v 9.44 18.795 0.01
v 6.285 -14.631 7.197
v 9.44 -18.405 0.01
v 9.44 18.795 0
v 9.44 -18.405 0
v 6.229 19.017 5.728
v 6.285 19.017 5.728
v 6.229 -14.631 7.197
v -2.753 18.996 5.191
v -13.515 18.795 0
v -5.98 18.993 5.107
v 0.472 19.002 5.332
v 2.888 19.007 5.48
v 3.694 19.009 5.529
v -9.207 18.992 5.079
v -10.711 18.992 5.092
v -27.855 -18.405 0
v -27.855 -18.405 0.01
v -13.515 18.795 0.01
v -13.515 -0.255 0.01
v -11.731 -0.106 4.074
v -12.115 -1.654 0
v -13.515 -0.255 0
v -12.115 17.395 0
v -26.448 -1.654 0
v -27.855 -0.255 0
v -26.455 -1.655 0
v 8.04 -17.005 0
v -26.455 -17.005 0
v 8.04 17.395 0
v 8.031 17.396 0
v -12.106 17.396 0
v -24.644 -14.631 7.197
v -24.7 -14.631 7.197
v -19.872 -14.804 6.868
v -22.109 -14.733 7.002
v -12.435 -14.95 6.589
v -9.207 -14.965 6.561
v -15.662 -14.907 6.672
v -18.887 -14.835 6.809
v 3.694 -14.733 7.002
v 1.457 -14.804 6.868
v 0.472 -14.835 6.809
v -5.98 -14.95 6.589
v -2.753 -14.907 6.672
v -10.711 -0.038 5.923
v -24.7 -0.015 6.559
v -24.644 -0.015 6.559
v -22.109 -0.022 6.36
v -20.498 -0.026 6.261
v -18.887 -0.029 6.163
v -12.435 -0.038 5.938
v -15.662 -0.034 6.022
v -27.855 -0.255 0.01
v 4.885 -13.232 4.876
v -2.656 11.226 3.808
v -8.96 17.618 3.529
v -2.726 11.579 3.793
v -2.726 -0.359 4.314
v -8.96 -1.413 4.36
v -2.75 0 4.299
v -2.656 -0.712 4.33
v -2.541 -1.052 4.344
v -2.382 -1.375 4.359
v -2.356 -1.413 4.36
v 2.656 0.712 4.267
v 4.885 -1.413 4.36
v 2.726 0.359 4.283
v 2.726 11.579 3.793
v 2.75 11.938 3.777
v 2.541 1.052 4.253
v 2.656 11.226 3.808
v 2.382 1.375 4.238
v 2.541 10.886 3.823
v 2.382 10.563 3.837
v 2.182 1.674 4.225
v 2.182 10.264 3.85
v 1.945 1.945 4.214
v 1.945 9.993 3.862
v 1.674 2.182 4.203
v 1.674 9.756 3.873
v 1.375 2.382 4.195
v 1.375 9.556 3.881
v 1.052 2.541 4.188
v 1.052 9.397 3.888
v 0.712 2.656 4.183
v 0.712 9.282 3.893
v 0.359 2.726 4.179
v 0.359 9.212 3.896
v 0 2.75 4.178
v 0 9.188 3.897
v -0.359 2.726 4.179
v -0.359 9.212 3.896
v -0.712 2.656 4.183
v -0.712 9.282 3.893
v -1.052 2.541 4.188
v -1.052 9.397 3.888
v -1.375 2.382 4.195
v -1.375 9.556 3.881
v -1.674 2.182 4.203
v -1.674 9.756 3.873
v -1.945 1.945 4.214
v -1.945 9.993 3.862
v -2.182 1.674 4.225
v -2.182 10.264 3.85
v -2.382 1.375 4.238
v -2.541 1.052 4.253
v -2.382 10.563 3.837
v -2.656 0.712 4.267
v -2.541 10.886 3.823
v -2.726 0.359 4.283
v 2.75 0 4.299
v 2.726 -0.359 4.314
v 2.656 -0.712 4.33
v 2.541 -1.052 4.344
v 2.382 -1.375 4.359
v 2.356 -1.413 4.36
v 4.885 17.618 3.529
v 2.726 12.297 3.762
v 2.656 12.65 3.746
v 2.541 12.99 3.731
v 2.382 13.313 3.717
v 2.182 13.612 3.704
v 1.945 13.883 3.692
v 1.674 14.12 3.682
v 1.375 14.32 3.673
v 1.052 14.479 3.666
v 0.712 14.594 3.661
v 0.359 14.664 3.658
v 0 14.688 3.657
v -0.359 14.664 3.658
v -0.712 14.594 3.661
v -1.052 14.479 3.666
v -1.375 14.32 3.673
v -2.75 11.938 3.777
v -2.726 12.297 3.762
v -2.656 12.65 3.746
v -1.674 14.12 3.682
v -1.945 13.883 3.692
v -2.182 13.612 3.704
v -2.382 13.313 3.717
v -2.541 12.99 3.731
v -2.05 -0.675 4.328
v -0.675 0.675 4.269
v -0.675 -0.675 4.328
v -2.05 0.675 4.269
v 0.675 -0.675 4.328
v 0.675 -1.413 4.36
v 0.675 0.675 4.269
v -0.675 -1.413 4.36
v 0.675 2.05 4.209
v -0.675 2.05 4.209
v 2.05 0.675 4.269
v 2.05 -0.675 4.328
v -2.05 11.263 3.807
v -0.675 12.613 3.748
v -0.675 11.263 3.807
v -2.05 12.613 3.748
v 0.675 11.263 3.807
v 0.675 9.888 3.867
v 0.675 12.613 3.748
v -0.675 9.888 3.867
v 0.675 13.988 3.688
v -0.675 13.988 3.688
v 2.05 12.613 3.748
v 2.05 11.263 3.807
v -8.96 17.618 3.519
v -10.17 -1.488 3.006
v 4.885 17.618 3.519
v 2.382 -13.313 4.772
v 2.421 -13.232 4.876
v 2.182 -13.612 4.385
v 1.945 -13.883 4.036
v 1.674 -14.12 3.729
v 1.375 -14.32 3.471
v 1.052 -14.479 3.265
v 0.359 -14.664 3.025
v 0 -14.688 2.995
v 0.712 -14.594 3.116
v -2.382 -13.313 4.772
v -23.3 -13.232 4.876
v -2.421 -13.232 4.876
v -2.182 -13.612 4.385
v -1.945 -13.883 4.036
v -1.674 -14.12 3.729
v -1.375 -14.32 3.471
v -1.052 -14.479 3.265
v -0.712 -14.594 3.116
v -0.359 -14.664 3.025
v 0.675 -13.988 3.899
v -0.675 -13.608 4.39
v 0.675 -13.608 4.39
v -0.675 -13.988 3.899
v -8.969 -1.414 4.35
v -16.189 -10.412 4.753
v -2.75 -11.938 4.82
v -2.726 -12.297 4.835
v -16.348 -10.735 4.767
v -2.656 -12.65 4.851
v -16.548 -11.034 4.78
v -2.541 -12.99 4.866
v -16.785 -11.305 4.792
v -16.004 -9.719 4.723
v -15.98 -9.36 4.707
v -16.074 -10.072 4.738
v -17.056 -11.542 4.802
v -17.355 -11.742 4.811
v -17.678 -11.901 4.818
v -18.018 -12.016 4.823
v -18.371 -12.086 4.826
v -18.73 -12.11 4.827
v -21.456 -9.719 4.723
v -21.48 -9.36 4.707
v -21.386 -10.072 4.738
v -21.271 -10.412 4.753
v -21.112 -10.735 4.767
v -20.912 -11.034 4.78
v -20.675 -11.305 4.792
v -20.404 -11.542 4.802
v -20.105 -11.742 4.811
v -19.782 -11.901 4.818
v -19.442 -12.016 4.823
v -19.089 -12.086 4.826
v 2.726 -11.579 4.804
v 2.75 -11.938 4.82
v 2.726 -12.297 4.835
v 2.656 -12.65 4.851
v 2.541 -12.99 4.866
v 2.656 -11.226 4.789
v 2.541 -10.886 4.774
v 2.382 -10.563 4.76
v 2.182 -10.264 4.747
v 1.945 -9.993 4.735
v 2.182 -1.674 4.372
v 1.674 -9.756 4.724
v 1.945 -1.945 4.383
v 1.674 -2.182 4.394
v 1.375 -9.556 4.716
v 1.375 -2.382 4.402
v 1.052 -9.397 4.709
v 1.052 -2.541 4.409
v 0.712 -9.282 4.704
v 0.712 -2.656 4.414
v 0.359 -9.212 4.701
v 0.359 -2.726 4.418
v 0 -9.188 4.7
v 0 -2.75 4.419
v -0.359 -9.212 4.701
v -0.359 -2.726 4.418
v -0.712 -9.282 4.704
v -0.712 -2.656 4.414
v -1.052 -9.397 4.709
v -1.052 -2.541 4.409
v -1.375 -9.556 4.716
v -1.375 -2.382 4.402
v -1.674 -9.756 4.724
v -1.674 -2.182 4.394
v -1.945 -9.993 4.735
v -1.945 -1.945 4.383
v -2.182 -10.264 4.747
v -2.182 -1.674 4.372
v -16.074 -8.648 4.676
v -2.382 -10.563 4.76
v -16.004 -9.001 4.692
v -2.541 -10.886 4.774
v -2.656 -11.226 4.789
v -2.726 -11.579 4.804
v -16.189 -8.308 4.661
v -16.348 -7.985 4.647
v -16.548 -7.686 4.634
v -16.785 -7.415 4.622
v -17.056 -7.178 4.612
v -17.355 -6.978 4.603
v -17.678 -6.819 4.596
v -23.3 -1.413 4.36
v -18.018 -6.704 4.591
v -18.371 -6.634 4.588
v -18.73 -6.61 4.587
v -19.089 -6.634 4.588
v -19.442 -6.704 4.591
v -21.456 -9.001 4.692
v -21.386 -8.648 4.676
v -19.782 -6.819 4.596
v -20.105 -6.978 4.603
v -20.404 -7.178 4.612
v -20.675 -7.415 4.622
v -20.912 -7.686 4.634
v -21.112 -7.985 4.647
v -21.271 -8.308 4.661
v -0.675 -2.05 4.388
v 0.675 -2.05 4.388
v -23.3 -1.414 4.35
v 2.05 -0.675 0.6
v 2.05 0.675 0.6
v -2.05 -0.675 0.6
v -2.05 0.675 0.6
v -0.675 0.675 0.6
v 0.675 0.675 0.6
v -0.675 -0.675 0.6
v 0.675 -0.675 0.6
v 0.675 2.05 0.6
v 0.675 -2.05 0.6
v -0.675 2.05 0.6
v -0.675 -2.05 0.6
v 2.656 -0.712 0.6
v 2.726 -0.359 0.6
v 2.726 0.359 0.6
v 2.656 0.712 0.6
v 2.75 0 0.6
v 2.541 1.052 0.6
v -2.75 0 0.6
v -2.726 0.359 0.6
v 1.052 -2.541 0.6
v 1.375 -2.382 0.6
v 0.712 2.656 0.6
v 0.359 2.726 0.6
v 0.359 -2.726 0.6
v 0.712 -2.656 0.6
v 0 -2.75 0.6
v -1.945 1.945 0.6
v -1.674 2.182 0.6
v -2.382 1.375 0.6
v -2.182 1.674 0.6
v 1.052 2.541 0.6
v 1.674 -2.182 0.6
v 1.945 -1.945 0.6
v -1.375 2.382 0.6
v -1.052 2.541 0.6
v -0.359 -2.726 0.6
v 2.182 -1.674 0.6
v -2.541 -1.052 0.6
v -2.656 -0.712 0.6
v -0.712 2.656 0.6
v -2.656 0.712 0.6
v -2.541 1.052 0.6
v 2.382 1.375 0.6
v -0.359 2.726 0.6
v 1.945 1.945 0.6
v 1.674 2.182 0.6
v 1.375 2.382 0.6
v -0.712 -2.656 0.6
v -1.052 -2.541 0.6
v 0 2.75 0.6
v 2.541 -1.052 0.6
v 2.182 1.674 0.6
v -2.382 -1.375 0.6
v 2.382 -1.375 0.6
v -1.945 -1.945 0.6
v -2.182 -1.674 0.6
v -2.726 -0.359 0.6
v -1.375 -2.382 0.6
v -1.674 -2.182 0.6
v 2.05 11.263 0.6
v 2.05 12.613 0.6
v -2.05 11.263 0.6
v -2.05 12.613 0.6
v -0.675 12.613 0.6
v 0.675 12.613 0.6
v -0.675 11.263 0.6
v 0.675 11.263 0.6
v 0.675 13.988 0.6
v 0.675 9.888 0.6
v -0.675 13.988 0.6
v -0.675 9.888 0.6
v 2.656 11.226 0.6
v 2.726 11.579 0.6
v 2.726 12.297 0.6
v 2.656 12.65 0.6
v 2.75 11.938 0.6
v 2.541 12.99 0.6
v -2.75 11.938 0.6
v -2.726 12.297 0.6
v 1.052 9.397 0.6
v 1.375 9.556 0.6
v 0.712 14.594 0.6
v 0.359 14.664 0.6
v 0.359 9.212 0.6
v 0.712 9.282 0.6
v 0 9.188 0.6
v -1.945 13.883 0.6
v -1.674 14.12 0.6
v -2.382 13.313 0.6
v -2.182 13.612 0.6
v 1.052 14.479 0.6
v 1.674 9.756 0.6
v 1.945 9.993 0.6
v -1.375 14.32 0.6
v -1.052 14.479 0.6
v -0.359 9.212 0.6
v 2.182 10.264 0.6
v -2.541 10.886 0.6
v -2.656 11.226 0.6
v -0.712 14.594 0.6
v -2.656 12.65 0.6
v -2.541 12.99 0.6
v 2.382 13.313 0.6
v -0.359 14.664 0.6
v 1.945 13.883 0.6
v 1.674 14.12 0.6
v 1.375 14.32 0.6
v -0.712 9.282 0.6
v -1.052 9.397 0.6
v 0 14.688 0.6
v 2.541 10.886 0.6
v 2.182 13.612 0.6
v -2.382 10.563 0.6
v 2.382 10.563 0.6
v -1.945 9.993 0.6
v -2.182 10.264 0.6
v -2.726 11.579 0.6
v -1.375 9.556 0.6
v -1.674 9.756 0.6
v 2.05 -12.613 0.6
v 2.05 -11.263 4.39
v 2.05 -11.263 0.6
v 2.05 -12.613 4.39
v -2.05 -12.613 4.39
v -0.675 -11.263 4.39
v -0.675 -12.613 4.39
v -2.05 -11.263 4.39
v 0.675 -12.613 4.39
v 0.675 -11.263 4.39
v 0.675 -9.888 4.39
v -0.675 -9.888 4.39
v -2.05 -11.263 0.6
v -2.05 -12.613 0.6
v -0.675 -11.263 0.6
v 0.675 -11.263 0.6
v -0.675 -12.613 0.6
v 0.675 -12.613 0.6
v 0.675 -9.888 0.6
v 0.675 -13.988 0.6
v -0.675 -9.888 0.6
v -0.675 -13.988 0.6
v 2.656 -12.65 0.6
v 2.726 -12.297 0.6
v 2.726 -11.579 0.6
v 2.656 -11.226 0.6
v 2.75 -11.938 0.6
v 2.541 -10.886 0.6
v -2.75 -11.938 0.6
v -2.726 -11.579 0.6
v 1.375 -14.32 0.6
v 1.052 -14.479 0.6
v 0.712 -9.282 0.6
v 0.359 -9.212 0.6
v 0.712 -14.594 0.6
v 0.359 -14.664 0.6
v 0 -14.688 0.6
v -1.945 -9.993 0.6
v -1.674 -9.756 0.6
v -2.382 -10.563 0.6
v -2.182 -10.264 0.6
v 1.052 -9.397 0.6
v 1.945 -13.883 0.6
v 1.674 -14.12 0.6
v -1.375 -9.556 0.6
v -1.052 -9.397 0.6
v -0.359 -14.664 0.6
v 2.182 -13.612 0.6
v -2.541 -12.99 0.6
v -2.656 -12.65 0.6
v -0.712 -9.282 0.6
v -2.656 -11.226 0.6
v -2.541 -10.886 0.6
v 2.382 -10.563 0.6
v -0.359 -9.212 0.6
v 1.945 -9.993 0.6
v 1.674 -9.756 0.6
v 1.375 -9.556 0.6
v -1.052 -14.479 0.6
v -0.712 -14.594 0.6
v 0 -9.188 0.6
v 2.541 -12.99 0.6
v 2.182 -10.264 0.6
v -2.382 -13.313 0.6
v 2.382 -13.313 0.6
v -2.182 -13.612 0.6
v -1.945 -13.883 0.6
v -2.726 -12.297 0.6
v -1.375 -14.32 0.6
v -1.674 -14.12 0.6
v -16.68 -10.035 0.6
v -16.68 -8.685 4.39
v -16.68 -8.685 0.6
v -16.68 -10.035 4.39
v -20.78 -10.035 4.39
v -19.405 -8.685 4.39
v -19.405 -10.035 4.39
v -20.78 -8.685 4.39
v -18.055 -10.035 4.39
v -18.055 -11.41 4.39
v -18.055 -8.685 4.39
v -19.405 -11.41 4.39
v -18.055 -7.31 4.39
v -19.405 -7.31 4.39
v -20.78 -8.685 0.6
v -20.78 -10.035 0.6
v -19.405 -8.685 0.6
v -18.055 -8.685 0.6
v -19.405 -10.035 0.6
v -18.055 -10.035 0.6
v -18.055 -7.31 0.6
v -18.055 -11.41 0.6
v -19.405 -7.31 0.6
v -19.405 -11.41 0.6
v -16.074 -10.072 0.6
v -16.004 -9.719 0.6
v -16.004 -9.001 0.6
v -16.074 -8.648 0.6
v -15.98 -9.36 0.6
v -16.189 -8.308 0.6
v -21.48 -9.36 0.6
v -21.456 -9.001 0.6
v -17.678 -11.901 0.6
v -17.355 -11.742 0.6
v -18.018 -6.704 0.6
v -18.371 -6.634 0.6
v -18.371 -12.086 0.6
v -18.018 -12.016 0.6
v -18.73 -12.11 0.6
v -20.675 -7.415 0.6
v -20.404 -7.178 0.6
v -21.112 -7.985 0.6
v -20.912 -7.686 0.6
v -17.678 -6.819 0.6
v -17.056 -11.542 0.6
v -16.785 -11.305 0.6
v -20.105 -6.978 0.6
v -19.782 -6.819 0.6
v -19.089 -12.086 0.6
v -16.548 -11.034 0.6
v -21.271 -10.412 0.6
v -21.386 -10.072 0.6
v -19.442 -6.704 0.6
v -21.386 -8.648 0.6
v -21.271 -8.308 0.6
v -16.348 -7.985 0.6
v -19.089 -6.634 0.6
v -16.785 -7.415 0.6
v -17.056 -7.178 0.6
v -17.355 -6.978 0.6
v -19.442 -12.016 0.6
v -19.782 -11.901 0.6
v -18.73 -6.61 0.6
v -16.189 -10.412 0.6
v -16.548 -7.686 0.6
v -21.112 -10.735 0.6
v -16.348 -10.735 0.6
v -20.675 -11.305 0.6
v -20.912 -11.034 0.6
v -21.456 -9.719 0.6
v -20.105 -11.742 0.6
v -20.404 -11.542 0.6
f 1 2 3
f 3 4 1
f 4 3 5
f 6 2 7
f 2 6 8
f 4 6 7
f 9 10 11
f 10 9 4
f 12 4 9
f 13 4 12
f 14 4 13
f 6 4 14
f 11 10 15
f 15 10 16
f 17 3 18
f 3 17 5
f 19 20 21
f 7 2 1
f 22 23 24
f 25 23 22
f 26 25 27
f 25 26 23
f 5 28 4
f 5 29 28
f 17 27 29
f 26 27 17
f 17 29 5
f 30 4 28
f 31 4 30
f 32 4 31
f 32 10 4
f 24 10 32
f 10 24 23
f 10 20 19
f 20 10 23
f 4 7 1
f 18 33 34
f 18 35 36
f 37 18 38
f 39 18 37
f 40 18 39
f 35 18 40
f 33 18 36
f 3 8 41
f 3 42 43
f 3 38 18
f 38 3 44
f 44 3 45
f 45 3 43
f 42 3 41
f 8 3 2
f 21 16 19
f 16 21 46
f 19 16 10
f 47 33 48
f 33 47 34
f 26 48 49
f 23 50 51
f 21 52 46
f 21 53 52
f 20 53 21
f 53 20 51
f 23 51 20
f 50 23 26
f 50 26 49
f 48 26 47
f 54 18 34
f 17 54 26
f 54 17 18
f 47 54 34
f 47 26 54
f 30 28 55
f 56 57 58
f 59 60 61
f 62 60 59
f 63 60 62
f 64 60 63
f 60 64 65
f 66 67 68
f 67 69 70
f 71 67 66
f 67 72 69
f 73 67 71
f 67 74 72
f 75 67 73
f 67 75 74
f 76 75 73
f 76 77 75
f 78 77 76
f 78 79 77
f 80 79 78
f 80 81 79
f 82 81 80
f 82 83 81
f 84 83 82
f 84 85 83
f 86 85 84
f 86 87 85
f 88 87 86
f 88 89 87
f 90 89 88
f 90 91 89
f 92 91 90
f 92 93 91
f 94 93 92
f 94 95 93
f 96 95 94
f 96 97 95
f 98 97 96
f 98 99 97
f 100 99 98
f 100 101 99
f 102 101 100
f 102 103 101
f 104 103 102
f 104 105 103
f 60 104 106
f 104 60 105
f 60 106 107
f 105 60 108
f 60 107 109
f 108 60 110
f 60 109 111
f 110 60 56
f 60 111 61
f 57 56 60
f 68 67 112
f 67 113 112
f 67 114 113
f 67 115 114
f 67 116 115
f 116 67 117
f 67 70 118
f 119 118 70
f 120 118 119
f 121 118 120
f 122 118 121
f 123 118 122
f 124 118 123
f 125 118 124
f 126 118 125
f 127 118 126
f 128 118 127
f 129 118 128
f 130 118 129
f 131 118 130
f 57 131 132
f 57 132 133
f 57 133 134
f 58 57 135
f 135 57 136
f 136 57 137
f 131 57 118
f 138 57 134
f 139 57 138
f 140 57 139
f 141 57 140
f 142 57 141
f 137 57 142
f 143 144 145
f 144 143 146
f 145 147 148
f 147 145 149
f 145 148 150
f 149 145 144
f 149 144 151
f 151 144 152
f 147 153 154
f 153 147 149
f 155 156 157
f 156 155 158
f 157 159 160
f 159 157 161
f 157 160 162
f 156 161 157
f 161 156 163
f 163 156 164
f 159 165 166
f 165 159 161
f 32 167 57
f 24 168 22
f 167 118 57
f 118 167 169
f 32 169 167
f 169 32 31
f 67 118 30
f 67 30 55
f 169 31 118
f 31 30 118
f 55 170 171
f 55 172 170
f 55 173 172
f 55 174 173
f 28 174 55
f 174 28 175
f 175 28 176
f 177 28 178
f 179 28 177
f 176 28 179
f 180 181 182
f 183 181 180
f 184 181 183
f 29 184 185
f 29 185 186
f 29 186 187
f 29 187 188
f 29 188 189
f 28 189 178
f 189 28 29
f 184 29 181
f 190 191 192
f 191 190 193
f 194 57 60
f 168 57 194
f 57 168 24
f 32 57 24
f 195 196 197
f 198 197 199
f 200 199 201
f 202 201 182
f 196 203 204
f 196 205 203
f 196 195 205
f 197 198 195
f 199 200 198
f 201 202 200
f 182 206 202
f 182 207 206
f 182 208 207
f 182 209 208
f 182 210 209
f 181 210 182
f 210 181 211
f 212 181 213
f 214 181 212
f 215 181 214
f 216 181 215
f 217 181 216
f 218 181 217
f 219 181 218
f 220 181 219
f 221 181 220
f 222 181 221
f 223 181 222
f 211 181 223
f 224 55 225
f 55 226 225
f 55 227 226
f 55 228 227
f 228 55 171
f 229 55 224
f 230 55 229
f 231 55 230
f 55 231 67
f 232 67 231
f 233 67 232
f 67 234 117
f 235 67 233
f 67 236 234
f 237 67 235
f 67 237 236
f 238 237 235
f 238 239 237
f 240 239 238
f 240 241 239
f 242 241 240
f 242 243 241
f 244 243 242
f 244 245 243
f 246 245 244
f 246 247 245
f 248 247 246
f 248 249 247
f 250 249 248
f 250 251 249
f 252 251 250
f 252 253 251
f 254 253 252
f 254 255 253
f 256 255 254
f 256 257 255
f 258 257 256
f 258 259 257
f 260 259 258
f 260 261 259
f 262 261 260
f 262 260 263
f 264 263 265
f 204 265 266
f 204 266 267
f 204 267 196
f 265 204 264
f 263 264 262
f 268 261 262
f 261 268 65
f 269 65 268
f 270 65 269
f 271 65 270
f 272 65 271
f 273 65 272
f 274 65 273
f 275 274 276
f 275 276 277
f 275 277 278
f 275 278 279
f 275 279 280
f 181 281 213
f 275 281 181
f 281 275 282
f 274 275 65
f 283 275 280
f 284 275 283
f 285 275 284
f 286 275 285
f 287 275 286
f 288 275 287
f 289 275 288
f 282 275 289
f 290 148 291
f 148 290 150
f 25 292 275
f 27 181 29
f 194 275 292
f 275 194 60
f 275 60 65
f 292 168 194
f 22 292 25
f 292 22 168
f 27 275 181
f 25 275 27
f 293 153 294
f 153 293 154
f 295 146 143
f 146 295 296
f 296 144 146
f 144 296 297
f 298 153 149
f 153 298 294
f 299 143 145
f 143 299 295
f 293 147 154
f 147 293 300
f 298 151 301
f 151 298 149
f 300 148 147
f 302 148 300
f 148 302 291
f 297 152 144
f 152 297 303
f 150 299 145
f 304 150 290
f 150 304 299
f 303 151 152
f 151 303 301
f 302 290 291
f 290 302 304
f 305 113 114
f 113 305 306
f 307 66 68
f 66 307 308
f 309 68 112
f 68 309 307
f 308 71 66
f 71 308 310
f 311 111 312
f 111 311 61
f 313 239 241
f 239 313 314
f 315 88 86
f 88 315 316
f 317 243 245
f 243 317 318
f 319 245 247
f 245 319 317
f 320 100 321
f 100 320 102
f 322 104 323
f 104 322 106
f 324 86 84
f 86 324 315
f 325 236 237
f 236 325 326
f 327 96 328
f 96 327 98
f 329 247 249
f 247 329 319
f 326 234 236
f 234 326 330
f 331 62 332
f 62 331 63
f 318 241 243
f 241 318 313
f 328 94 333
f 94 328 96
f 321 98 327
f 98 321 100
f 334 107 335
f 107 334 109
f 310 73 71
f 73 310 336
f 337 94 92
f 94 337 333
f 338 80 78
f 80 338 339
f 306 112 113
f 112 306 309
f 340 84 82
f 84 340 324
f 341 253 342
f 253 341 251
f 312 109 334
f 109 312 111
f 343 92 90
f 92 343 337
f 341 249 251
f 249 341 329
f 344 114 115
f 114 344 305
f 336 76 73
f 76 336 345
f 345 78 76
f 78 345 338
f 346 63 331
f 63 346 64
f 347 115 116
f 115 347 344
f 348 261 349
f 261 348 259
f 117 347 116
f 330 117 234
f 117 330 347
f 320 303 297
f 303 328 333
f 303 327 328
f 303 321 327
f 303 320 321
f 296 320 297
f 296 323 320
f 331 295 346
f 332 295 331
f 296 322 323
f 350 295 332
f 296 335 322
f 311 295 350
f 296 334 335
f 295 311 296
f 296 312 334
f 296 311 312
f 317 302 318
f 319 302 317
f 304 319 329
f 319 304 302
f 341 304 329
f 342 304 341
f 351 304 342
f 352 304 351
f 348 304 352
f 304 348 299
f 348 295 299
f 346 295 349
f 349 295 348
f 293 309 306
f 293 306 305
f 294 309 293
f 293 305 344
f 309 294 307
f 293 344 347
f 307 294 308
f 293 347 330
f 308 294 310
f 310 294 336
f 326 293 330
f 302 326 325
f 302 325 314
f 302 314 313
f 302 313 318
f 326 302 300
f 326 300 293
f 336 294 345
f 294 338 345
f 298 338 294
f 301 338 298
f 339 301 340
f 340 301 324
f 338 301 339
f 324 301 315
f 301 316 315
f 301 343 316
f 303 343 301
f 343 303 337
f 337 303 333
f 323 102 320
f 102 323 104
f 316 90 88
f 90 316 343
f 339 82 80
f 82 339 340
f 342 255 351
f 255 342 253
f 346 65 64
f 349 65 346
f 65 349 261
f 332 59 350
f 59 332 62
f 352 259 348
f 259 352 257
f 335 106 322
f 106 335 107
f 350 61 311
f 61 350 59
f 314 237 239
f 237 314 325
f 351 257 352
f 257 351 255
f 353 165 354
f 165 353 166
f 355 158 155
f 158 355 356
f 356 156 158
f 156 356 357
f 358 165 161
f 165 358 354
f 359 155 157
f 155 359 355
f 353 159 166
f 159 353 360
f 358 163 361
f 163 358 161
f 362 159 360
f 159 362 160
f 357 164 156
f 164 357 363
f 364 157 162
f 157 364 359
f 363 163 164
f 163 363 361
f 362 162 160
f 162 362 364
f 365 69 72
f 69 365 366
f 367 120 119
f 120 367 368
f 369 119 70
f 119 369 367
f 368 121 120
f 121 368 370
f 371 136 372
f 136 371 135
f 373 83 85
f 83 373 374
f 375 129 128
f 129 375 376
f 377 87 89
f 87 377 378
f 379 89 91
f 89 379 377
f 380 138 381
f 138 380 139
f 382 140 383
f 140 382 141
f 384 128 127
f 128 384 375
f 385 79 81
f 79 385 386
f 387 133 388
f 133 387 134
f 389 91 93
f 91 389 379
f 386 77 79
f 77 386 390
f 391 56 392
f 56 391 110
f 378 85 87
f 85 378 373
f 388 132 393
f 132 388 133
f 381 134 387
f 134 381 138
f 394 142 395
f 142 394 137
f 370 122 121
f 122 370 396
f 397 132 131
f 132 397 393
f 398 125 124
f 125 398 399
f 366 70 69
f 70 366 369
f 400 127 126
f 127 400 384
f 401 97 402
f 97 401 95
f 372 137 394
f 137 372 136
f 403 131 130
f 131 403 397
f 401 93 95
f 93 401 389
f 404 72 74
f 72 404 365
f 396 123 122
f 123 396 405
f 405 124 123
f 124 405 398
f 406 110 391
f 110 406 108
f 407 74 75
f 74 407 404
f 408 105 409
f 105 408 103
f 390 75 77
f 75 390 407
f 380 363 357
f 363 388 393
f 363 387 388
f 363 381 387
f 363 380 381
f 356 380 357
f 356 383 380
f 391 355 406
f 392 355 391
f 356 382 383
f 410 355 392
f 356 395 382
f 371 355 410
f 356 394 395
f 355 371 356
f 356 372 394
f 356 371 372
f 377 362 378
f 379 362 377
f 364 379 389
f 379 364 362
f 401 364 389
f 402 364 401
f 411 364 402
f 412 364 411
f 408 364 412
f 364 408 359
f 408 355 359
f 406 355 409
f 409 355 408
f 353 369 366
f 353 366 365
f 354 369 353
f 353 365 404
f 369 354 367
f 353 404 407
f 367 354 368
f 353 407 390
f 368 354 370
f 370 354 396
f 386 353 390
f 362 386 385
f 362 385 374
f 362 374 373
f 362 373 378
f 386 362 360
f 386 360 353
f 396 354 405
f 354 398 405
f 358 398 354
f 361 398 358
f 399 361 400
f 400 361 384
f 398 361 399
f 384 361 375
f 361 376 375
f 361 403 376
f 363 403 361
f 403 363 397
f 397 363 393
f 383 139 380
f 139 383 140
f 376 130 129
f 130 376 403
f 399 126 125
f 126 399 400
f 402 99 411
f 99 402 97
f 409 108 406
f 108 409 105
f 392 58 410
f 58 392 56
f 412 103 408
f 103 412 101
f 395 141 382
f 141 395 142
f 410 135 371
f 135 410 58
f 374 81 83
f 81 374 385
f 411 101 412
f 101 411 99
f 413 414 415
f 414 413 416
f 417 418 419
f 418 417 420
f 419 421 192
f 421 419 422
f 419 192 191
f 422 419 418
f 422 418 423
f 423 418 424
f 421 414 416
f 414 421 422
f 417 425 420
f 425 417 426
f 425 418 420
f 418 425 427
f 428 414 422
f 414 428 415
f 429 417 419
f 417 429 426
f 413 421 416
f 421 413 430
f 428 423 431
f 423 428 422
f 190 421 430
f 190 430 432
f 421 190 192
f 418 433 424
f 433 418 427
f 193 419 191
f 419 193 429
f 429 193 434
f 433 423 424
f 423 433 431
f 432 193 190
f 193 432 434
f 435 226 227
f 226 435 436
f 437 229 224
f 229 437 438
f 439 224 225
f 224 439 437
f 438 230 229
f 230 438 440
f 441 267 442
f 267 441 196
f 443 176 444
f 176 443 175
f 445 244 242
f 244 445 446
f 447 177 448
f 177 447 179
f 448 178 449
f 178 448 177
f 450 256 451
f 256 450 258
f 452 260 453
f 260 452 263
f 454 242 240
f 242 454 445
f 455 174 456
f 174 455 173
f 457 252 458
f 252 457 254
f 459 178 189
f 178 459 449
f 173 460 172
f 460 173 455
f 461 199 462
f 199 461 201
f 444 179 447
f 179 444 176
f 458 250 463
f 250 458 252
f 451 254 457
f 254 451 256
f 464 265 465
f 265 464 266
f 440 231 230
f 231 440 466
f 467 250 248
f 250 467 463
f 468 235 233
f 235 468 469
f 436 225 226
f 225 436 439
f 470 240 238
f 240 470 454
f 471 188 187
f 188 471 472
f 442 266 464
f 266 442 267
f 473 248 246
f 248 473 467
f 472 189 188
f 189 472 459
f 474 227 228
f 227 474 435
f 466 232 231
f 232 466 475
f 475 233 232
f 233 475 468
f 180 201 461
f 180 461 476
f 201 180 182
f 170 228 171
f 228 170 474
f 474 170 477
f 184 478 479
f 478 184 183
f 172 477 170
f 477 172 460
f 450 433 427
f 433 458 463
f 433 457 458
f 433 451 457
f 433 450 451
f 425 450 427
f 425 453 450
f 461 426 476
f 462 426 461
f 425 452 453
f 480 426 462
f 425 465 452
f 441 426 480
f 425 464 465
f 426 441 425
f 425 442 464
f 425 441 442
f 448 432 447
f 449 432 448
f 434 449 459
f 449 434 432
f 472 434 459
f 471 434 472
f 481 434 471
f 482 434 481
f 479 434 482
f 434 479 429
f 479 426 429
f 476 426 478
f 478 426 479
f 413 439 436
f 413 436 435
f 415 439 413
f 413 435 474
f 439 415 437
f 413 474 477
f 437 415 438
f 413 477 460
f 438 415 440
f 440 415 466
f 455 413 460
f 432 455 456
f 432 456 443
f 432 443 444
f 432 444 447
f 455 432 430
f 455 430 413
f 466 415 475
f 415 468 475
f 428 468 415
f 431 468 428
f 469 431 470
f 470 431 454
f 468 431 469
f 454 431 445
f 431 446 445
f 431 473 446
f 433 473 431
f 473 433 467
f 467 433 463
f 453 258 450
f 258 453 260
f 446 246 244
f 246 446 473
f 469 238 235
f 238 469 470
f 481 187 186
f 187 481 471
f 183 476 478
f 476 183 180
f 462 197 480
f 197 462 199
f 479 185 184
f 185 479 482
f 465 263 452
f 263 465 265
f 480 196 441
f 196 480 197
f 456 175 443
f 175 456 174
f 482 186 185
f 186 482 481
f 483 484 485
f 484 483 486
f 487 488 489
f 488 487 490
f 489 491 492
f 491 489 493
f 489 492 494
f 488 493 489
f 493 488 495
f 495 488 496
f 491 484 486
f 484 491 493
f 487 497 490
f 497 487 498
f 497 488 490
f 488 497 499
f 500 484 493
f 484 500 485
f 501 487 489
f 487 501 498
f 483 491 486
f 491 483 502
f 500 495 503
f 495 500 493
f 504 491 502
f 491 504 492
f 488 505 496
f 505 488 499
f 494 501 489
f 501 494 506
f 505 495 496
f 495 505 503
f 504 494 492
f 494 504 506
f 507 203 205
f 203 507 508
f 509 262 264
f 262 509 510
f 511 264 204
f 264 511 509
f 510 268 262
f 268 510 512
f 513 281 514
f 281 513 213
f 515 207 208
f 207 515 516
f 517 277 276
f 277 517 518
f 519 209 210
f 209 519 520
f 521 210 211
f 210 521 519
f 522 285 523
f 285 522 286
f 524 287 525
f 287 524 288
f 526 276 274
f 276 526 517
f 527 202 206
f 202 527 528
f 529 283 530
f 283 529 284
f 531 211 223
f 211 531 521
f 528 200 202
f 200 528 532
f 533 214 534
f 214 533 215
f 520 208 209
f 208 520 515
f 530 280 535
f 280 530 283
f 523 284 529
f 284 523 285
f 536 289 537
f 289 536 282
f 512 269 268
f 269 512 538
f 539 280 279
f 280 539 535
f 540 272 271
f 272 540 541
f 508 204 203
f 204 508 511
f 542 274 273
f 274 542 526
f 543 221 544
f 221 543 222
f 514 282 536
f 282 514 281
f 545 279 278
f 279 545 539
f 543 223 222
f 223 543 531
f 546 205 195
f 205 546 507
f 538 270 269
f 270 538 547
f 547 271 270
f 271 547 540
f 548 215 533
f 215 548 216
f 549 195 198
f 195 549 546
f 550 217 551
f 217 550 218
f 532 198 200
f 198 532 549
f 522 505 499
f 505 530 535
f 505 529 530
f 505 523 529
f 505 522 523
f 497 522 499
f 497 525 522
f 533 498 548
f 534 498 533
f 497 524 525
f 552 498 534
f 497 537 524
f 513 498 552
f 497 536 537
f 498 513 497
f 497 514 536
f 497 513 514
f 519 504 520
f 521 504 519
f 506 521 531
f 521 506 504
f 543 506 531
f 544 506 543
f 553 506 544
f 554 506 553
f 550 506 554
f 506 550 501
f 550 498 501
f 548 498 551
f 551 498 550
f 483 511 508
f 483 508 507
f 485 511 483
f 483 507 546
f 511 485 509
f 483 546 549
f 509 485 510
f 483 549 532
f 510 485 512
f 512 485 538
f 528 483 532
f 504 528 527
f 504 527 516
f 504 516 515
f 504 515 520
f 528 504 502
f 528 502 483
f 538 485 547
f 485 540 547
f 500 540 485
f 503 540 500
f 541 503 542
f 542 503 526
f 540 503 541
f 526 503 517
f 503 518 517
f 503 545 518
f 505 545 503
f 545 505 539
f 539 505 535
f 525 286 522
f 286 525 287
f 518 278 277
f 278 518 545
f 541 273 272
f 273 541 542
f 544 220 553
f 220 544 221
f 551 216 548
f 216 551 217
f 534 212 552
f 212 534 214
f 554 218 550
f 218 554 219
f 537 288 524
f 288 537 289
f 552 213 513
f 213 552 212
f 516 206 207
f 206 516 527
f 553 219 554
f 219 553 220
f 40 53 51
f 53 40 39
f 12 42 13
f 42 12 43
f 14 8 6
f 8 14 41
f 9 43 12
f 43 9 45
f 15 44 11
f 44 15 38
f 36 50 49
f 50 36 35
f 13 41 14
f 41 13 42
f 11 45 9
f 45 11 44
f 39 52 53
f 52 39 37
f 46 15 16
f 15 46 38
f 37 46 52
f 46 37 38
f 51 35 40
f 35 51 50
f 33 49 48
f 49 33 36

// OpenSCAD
// a1000_keycaps.scad
//
// Keycaps for the rev 2 board (Cherry MX) in the A1000's sizes, for the keys an off-the-shelf MX
// set doesn't cover:
//   return     US Return, 1.25U over 2U (SW41).  The A500KB's US Return cap is 1.5U over 2.25U,
//              so it runs into HELP and UP.
//   tilde      ` ~, 1.25U (SW13)
//   backspace  1.75U (SW70)
//   tab        1.75U (SW28)
//   lshift     US left Shift, 2.5U (SW87), on a 2U stabiliser
//   rshift     right Shift, 2U (SW91), on a 2U stabiliser
// Pick one with -D 'key="tab"'.
//
// Coordinates: x right, y away from the typist, origin at the key's switch stem.  Sizes are the
// A1000's key grid, from the rev 2 board's switch positions.
//
// The profile is Cherry's (as made by GMK), with figures from KeyV2's cherry profile
// (github.com/rsheldiii/KeyV2): a height and tilt for each row, a cylindrical dish, and a top
// narrower than the skirt and shifted back.  It isn't the A1000's own sculpt.  Each key takes the
// Cherry row of the board row it sits in; Return takes the home row's, with the tilt spread over
// its two rows as KeyV2 does for tall keys.
// Print top down, the stems pointing up.  The dished top needs a little support or a raft.
//
// Render:  openscad -D 'key="tab"' -o tab_keycap.stl a1000_keycaps.scad

/* ---------------------------------------------------------------- parameters */

key              = "return";  // [return, tilde, backspace, tab, lshift, rshift]

U                = 19.05;

// Return: key grid edges, from the board, around the Return stem (x 295.13)
grid_left_top    = -13.965;  // right edge of ]   (271.64 + 9.525)
grid_left_bottom = -28.305;  // right edge of '   (257.30 + 9.525)
grid_right       =   9.89;   // left edges of HELP and UP (305.045, 304.995)
grid_back        =  19.245;  // back edge of row 2 (row centre 112.81)
grid_mid         =   0.195;  // between rows 2 and 3
grid_front       = -18.855;  // front edge of row 3 (row centre 131.86)
dummy            = [-18.73, -9.36];   // SW55 (276.40, 131.89), the Return cap's dummy switch

// The straight keys: width in U, whether they ride on a 2U stabiliser, and Cherry row.  Each stem
// is centred in its key on the board.
straight = [
    ["tilde",     1.25, false, 1],
    ["backspace", 1.75, false, 1],
    ["tab",       1.75, false, 2],
    ["lshift",    2.5,  true,  4],
    ["rshift",    2.0,  true,  4],
];
return_row       = 3;

stab             = 11.938;   // 2U stabiliser inserts, either side of the switch

// Cherry profile.  Rows count from the number row (1) to the Shift row (4).  Height is skirt bottom
// to the middle of the top, before the dish; tilt is in degrees, the front edge raised.
cherry           = [[9.8, 0], [7.45, 2.5], [6.55, 5], [7.35, 11.5]];
top_in_x         = 3.155;    // top in from the skirt, each side: 18.16 at the skirt, 11.85 at the top
top_in_y         = 1.76;     //   and 14.64 front to back
top_skew         = 2.0;      // top moved back
dish_depth       = 0.65;     // cylindrical, across the key

// Cap
gap              = 0.45;     // in from the grid at the skirt, each side (an 18.15 mm 1U cap)
wall             = 1.4;
top_t            = 1.6;      // under the bottom of the dish

// MX stem
stem_d           = 5.5;
cross_l          = 4.1;      // cross slot, each arm
cross_w          = 1.35;     // tune for the printer: the switch's cross is 4.0 x 1.17 / 1.30
cross_depth      = 3.8;
stem_drop        = 0.6;      // stem bottom above the skirt bottom, as on Cherry caps

$fn = 48;

/* ---------------------------------------------------------------- model */

row = [for (k = straight) if (k[0] == key) k];
assert(key == "return" || len(row) == 1, str("unknown key: ", key));
half   = key == "return" ? 0 : row[0][1] * U / 2;
crow   = key == "return" ? return_row : row[0][3];
height = cherry[crow - 1][0];
tilt   = cherry[crow - 1][1] / (key == "return" ? 2 : 1);    // over the key's height in U
y_mid  = key == "return" ? (grid_front + grid_back) / 2 : 0;   // the top tilts about the key's middle

// The top's plane: tilted about the key's middle, `down` below the top surface
module on_top(down = 0) {
    translate([0, y_mid, height - down]) rotate([-tilt, 0, 0]) translate([0, -y_mid, 0]) children();
}

// A part from [x0, x1] x [y0, y1] at the skirt to the tilted top, grown by `out` and with its top
// `down` lower
module part(x0, x1, y0, y1, out = 0, down = 0) {
    hull() {
        translate([x0 - out, y0 - out, 0]) cube([x1 - x0 + 2 * out, y1 - y0 + 2 * out, 0.01]);
        on_top(down) translate([x0 + top_in_x - out, y0 + top_in_y + top_skew - out, -0.01])
            cube([x1 - x0 - 2 * top_in_x + 2 * out, y1 - y0 - 2 * top_in_y + 2 * out, 0.01]);
    }
}

// Return: the L, the column the two rows share and the bottom row's extension to the left.
// The rest: a rectangle.
module shape(out = 0, down = 0) {
    if (key == "return") {
        part(grid_left_top + gap, grid_right - gap, grid_front + gap, grid_back - gap, out, down);
        part(grid_left_bottom + gap, grid_right - gap, grid_front + gap, grid_mid - gap, out, down);
    } else {
        part(-half + gap, half - gap, -U / 2 + gap, U / 2 - gap, out, down);
    }
}

// The dish: a cylinder along the key, dish_depth deep across the widest part of the top
dish_x0 = key == "return" ? grid_left_bottom + gap + top_in_x : -half + gap + top_in_x;
dish_x1 = key == "return" ? grid_right - gap - top_in_x      : half - gap - top_in_x;
dish_w  = dish_x1 - dish_x0;
dish_r  = (dish_w * dish_w / 4 + dish_depth * dish_depth) / (2 * dish_depth);
module dish() {
    on_top() translate([(dish_x0 + dish_x1) / 2, 0, dish_r - dish_depth])
        rotate([90, 0, 0]) cylinder(r = dish_r, h = 4 * U, center = true, $fn = 360);
}

module stem(p) {
    translate([p[0], p[1], stem_drop]) difference() {
        cylinder(d = stem_d, h = height + 5);
        translate([0, 0, -0.01]) {
            translate([-cross_l / 2, -cross_w / 2, 0]) cube([cross_l, cross_w, cross_depth]);
            translate([-cross_w / 2, -cross_l / 2, 0]) cube([cross_w, cross_l, cross_depth]);
        }
    }
}

stems = key == "return" ? [[0, 0], [0, stab], [0, -stab], dummy]   // vertical stabiliser
      : row[0][2]       ? [[0, 0], [-stab, 0], [stab, 0]]
      :                   [[0, 0]];

difference() {
    union() {
        difference() {
            shape();
            translate([0, 0, -0.01]) shape(-wall, top_t + dish_depth);
        }
        intersection() {
            union() for (p = stems) stem(p);
            shape();
        }
    }
    dish();
}
